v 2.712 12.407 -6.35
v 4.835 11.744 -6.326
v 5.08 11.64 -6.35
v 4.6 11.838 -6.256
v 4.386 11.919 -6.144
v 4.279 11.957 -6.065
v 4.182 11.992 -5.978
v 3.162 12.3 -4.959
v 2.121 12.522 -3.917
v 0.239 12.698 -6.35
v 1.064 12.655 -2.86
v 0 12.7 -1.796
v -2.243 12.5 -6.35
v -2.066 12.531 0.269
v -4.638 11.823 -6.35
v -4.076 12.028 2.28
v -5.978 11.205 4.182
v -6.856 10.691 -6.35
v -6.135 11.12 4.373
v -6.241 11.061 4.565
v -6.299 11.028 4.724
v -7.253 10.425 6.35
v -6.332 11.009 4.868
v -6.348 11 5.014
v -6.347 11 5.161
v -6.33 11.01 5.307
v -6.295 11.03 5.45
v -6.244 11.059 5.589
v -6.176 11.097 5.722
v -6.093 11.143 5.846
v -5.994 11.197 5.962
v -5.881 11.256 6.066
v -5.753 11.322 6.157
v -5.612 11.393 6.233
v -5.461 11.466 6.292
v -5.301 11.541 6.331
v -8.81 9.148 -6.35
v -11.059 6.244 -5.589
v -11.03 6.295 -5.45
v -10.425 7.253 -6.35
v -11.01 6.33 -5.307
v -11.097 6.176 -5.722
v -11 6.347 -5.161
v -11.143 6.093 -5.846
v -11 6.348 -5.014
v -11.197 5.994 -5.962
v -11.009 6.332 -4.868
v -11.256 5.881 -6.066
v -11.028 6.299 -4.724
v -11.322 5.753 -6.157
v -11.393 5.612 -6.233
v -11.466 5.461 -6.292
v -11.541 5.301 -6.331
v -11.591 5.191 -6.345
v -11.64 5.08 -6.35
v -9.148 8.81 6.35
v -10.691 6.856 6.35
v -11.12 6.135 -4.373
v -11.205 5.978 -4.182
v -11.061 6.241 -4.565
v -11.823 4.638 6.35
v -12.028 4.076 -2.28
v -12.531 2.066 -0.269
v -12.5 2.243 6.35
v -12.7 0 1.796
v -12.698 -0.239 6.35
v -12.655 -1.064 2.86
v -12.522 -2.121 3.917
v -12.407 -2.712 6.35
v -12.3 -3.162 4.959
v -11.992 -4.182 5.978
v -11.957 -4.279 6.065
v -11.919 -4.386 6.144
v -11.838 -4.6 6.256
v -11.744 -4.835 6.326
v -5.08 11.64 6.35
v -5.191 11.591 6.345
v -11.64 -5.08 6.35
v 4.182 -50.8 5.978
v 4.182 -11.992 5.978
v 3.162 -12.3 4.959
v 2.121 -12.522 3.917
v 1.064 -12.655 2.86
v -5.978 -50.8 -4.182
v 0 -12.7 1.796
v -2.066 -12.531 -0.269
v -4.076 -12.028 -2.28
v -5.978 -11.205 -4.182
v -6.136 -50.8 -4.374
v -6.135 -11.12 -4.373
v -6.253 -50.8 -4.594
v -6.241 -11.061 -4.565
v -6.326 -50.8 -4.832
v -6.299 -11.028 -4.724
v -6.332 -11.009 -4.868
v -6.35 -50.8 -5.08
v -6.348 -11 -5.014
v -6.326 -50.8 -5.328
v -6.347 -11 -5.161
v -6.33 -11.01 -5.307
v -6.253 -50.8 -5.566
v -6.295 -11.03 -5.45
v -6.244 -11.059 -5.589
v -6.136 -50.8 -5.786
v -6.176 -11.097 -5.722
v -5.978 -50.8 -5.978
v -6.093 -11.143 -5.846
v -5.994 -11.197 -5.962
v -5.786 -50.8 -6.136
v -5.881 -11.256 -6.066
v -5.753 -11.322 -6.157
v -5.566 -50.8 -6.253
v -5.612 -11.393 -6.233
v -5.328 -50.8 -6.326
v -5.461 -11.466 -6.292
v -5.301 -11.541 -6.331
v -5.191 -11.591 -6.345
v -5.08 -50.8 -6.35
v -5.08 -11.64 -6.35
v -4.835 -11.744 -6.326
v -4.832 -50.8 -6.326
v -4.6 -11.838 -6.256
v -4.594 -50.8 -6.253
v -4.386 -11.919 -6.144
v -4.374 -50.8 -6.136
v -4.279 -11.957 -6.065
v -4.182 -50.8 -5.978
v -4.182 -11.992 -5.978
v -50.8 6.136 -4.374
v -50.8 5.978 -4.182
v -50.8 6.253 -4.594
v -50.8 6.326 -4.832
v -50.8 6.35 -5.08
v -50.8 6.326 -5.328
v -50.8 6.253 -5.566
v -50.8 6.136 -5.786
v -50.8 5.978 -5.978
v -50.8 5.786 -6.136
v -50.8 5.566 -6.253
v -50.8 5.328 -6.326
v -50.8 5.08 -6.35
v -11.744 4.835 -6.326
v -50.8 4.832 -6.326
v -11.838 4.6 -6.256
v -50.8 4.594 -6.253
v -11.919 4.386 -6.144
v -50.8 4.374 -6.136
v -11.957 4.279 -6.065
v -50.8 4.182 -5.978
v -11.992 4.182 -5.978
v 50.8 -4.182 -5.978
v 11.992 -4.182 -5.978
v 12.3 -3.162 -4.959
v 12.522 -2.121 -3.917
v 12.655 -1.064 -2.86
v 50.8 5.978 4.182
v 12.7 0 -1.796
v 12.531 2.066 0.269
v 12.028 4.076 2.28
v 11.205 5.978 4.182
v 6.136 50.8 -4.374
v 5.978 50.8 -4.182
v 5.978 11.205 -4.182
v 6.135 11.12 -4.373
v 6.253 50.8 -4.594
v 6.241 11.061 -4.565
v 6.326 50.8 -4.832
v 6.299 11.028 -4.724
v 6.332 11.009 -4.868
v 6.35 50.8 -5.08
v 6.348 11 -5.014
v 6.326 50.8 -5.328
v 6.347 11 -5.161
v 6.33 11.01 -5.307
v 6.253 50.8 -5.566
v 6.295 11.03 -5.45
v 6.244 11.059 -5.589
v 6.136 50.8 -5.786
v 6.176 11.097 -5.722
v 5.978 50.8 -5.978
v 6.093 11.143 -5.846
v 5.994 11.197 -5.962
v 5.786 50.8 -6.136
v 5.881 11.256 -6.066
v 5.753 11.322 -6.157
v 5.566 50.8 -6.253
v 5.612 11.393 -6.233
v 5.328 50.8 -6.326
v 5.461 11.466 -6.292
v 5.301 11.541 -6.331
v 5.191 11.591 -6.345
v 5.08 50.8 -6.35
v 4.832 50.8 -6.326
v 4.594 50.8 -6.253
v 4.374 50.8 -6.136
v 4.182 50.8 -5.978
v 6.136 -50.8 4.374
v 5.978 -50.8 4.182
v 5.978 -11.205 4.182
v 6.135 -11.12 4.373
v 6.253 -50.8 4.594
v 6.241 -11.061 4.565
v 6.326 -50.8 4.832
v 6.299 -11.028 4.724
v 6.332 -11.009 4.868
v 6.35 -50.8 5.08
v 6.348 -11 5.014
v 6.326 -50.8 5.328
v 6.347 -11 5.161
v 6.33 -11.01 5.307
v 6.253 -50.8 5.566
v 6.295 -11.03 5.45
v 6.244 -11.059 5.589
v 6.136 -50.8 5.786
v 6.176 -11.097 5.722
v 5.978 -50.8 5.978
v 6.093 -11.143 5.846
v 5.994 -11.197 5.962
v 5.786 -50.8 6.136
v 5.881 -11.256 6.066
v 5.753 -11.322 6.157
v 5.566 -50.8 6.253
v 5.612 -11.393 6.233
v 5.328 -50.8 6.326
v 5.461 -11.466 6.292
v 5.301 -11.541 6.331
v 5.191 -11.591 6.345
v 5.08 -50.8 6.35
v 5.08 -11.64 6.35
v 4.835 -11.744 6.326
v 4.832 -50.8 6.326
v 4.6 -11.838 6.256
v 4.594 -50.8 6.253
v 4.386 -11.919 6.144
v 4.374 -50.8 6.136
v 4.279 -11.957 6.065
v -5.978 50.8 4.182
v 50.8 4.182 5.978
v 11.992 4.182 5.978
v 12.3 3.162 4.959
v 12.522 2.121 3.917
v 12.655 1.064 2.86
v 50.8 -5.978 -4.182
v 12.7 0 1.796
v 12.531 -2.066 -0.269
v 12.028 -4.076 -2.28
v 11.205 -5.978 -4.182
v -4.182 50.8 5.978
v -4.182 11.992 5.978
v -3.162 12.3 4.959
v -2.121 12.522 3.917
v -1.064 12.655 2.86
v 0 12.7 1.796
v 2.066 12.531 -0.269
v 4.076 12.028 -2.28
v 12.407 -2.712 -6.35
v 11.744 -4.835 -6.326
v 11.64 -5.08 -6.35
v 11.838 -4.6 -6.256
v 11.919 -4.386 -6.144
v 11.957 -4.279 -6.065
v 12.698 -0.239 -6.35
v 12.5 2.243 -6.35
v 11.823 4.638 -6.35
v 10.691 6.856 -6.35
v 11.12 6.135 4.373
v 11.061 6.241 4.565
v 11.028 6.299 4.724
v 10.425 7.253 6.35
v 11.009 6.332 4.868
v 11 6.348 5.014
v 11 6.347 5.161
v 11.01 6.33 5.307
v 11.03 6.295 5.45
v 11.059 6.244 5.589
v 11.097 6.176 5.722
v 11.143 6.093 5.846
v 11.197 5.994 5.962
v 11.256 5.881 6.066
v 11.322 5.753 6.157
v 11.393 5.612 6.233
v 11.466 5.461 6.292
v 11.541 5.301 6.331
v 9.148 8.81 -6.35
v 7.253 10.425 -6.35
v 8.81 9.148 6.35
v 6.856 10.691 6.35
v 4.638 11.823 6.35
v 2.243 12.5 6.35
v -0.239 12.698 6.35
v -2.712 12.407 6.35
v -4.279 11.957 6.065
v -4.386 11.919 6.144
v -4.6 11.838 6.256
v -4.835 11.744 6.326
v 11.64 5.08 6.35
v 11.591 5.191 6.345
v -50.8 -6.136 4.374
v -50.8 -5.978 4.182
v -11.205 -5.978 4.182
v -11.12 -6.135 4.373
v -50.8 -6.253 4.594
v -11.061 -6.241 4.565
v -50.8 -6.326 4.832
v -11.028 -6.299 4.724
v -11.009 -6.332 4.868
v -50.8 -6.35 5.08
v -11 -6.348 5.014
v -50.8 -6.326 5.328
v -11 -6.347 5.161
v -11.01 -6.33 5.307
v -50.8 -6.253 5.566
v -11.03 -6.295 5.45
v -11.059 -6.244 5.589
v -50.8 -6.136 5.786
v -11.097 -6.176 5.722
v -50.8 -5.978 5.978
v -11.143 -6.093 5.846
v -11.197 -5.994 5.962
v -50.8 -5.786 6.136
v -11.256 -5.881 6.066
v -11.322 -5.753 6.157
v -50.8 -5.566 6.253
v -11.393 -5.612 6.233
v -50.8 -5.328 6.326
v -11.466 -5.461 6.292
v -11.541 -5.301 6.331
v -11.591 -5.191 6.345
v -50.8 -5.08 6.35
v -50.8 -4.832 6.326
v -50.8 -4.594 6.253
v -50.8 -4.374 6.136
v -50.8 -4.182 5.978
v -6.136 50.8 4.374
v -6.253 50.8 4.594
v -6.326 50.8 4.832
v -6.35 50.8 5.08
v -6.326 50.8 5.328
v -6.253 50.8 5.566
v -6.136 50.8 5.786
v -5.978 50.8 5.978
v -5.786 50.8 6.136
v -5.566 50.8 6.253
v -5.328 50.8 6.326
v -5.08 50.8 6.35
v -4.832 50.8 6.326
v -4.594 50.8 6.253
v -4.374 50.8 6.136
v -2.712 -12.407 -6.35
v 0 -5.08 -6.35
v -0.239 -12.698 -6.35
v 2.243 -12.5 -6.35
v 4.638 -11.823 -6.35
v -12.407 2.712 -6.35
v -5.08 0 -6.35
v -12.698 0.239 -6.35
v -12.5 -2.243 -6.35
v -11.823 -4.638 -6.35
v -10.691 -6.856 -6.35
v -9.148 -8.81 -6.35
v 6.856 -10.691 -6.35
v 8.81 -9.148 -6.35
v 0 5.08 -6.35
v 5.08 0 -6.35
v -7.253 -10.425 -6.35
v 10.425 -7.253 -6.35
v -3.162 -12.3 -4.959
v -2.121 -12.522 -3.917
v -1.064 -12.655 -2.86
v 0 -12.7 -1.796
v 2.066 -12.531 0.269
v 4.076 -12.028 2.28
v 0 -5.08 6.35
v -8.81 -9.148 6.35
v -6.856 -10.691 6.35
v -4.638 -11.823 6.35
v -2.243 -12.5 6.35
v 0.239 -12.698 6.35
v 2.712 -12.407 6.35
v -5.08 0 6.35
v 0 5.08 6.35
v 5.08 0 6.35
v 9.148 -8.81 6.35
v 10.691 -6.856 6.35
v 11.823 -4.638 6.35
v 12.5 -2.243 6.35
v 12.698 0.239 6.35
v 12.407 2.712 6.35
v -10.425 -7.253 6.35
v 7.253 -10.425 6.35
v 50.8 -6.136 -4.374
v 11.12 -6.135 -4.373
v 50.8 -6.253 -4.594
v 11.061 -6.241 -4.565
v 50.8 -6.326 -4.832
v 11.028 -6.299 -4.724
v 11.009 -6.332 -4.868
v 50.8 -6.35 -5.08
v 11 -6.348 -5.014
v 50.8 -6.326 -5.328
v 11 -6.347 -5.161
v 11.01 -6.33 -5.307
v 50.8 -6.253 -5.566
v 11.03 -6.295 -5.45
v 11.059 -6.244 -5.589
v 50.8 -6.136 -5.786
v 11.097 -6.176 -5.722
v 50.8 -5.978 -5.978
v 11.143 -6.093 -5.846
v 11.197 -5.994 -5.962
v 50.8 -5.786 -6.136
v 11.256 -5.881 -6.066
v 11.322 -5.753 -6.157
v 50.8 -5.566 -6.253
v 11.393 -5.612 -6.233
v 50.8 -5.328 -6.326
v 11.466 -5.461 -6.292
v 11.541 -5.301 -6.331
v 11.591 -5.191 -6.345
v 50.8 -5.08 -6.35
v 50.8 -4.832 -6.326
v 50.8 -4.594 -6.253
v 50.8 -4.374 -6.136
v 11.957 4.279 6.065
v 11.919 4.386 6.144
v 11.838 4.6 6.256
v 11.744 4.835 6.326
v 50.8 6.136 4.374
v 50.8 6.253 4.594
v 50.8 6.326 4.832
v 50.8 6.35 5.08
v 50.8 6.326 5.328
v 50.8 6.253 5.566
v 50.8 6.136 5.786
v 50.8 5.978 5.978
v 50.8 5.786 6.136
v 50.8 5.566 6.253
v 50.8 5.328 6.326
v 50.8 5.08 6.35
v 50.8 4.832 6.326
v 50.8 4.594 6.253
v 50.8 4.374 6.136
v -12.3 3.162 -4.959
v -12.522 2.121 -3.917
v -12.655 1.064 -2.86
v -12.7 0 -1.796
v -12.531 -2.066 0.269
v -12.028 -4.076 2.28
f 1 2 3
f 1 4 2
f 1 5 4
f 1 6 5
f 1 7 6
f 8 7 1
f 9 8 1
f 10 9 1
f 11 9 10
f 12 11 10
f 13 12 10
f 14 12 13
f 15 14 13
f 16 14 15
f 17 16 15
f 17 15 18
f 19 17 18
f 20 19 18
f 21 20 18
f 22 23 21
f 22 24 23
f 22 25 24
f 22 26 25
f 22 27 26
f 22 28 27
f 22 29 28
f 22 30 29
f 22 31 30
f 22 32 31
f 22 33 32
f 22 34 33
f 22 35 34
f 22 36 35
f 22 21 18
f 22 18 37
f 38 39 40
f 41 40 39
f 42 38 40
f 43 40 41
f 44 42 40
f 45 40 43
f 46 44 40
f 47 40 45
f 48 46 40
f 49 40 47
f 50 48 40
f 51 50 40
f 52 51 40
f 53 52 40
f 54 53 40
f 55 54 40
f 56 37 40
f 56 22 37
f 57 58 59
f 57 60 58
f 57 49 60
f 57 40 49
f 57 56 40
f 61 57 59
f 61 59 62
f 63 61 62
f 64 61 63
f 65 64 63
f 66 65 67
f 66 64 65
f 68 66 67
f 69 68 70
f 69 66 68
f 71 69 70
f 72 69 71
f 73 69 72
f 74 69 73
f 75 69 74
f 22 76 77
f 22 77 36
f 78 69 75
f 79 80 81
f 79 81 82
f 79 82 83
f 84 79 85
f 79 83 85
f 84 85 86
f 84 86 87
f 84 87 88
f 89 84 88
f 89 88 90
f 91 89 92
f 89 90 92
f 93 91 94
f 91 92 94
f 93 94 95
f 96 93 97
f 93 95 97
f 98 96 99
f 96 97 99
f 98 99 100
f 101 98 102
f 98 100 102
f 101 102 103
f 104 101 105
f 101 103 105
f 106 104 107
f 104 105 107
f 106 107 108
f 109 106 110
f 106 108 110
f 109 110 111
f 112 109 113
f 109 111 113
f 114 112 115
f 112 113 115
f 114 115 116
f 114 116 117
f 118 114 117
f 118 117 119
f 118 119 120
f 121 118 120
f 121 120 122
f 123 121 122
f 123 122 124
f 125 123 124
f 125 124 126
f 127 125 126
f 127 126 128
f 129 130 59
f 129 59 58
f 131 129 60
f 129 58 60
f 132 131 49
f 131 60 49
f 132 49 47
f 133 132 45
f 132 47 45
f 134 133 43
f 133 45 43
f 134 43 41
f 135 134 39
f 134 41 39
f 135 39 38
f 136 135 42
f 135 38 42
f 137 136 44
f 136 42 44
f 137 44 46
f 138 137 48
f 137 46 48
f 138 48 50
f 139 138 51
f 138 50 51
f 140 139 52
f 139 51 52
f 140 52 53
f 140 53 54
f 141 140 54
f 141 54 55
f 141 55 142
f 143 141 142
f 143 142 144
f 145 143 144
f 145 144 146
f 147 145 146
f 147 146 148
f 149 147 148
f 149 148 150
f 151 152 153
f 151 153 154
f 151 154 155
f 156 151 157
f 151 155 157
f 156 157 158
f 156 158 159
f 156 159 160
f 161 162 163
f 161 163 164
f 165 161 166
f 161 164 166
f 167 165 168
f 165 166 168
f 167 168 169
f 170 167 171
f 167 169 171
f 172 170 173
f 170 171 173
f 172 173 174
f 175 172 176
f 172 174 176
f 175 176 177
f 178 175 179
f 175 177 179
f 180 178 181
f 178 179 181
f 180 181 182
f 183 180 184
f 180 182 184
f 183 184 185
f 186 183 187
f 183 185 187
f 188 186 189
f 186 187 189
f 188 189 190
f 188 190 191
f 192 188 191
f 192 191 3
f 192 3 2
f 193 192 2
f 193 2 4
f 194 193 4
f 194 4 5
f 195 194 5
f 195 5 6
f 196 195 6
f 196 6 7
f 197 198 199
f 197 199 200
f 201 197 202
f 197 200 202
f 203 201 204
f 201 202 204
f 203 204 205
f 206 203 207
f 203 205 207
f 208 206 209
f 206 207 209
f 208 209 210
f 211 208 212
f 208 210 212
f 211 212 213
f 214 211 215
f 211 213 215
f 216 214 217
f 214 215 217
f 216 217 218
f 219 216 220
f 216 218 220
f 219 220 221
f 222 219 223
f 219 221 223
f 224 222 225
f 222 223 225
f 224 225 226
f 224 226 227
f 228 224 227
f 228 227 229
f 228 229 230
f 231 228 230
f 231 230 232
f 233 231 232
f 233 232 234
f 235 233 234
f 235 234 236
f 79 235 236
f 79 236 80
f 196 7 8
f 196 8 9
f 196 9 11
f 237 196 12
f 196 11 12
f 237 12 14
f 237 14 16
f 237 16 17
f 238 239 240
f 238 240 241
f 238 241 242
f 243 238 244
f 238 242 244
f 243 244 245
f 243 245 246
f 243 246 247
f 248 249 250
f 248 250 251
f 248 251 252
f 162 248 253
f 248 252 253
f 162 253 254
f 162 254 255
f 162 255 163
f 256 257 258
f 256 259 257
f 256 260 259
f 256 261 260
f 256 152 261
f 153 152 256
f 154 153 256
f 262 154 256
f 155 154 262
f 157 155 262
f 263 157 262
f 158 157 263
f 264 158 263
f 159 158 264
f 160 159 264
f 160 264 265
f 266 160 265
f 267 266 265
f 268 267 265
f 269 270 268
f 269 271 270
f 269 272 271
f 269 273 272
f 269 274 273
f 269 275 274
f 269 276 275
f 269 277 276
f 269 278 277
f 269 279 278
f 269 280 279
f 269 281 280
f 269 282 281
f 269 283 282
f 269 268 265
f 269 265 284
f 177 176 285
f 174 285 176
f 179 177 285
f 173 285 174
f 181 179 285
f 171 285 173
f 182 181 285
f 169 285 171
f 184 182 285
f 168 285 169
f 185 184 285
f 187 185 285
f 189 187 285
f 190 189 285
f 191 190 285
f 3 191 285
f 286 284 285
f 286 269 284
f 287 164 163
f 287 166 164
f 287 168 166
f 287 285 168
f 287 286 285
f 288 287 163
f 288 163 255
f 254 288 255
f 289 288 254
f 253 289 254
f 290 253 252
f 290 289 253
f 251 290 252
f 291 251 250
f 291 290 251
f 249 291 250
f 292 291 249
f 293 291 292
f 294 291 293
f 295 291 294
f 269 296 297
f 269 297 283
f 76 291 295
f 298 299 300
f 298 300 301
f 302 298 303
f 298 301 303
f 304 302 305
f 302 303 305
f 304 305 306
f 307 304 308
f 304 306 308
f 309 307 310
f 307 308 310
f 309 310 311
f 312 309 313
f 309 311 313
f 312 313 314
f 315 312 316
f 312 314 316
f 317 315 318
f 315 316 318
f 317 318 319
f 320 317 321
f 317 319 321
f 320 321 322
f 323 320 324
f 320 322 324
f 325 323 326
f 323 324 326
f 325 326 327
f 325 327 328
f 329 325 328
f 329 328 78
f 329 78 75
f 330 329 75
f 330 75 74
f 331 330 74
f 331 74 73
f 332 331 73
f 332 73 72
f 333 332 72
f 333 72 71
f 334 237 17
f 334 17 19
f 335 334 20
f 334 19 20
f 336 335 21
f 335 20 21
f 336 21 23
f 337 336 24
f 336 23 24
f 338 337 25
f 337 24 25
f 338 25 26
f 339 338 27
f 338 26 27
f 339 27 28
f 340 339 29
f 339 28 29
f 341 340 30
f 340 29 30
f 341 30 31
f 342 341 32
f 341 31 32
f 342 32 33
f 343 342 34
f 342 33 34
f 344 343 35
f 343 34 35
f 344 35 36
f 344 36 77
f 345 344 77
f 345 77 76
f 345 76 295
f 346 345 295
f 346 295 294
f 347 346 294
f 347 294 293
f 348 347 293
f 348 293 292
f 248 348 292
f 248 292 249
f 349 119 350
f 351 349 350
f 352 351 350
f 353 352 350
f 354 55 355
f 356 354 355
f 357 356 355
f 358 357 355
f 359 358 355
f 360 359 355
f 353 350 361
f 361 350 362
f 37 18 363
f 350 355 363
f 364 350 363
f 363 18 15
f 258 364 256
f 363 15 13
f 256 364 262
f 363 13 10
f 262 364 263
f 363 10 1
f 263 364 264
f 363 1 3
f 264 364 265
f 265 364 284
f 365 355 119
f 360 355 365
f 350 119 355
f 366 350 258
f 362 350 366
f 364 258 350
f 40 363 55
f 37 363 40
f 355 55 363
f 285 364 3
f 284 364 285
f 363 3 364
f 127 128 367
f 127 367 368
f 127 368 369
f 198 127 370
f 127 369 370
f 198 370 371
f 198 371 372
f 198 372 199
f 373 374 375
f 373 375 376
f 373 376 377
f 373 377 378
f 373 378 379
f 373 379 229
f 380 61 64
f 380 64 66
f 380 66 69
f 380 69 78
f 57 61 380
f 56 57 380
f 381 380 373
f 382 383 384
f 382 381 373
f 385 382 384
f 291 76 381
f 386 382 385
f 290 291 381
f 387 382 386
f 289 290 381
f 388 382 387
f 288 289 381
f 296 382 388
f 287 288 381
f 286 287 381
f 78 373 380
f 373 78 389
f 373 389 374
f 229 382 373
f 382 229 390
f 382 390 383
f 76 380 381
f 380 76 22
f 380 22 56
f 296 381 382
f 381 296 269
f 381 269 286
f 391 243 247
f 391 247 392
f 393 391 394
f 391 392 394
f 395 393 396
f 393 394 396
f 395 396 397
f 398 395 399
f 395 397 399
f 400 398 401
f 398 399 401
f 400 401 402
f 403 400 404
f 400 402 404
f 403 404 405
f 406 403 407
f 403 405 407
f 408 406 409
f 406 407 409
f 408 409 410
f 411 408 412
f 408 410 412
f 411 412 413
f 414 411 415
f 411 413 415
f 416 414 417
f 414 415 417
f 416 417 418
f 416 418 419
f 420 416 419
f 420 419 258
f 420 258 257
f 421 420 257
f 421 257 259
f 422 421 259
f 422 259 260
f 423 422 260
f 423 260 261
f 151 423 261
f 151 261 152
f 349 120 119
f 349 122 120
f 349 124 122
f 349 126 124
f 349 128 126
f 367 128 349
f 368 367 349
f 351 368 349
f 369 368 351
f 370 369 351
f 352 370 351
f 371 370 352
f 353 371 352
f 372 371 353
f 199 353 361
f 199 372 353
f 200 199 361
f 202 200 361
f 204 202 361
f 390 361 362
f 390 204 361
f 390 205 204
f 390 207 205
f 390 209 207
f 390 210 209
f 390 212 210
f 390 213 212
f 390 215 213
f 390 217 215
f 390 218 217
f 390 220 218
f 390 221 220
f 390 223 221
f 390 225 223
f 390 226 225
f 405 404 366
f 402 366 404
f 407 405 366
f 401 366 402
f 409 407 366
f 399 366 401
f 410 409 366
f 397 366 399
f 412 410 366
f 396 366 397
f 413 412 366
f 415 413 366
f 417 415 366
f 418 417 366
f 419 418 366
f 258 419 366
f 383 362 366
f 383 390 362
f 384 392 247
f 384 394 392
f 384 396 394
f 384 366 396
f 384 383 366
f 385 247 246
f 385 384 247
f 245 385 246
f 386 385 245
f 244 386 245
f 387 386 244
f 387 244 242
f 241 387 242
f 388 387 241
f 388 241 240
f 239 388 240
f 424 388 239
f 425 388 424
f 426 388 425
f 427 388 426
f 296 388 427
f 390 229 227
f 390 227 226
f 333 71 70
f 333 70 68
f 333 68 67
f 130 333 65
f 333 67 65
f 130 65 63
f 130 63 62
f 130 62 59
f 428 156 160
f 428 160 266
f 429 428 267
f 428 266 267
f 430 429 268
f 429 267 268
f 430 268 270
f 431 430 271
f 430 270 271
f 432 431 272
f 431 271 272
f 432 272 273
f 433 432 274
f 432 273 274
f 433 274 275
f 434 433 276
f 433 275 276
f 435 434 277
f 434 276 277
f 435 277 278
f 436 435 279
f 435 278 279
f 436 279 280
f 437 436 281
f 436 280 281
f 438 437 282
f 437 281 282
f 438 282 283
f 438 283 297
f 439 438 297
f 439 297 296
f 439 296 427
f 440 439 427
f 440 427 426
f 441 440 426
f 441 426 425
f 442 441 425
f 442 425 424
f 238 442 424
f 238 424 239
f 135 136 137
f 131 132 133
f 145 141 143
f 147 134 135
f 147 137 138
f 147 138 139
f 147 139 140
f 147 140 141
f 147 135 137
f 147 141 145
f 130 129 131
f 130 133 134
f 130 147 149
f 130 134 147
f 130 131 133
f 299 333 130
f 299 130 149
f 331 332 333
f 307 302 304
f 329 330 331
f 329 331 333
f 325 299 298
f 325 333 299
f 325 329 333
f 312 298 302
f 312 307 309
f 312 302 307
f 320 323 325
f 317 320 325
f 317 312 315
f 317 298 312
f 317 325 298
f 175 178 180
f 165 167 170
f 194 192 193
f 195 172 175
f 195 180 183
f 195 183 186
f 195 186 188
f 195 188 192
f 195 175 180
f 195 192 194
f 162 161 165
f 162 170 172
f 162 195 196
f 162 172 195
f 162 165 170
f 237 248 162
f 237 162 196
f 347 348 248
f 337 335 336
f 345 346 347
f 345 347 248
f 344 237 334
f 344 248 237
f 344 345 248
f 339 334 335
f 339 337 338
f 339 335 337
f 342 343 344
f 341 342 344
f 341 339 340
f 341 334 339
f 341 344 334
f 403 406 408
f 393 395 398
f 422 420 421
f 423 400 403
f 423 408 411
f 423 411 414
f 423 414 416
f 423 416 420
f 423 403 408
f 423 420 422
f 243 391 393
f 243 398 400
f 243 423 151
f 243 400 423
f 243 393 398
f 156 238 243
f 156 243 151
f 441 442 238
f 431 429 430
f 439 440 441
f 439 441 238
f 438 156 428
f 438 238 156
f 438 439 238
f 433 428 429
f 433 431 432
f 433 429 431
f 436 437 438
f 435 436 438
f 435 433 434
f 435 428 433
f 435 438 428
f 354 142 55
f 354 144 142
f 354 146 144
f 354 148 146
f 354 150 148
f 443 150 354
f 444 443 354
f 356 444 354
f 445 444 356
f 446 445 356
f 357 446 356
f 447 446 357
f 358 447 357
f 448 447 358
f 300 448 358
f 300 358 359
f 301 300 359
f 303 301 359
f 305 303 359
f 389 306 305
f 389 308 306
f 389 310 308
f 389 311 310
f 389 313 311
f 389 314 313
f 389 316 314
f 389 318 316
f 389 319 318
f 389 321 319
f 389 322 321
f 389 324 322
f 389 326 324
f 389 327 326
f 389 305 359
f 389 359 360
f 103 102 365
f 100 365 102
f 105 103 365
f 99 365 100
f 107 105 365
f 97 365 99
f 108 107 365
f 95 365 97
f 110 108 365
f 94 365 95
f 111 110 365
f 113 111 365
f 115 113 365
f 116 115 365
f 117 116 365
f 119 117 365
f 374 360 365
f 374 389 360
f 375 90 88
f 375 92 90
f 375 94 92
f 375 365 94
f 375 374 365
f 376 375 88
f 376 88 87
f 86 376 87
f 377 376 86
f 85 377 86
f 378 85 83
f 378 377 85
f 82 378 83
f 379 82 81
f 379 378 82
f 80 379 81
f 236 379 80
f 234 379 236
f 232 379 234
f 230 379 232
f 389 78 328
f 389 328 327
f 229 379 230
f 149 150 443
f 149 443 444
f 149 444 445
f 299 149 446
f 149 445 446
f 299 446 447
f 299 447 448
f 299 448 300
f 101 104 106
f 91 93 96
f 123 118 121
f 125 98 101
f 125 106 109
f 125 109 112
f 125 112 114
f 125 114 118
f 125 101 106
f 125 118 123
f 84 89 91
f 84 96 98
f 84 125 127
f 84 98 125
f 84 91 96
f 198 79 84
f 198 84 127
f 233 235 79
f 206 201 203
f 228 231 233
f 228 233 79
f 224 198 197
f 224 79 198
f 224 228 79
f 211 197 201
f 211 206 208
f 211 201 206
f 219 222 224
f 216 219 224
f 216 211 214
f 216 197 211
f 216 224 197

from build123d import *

# Parameters (mm, degrees)
F0_R     = 12.7
F1_DEPTH = 6.35
F3_DEPTH = 50.8
F4_COUNT = 4


with BuildPart() as f1:
    # F0 (on Top) → F1 (new body, symmetric)
    with BuildSketch(Plane.XY):
        Circle(F0_R)
    extrude(amount=F1_DEPTH, both=True)

    # F2 (on Right) → F3 (join)
    with BuildSketch(Plane.YZ):
        with BuildLine():
            Line((-4.1819743879, -5.9780256121), (5.9780256121, 4.1819743879))
            ThreePointArc((5.9780256121, 4.1819743879), (5.9780256121, 5.9780256121), (4.1819743879, 5.9780256121))
            Line((4.1819743879, 5.9780256121), (-5.9780256121, -4.1819743879))
            ThreePointArc((-5.9780256121, -4.1819743879), (-5.9780256121, -5.9780256121), (-4.1819743879, -5.9780256121))
        make_face()
    extrude(amount=F3_DEPTH)

    # F4: F1 ×4 about axis
    f4_axis = Axis((0, 0, 0), (0, 0, 1))


with BuildPart() as f1_1:
    add(f1.part)
    for i in range(1, F4_COUNT):
        add(f1.part.rotate(f4_axis, i * 360 / F4_COUNT))


solid = f1_1.part
